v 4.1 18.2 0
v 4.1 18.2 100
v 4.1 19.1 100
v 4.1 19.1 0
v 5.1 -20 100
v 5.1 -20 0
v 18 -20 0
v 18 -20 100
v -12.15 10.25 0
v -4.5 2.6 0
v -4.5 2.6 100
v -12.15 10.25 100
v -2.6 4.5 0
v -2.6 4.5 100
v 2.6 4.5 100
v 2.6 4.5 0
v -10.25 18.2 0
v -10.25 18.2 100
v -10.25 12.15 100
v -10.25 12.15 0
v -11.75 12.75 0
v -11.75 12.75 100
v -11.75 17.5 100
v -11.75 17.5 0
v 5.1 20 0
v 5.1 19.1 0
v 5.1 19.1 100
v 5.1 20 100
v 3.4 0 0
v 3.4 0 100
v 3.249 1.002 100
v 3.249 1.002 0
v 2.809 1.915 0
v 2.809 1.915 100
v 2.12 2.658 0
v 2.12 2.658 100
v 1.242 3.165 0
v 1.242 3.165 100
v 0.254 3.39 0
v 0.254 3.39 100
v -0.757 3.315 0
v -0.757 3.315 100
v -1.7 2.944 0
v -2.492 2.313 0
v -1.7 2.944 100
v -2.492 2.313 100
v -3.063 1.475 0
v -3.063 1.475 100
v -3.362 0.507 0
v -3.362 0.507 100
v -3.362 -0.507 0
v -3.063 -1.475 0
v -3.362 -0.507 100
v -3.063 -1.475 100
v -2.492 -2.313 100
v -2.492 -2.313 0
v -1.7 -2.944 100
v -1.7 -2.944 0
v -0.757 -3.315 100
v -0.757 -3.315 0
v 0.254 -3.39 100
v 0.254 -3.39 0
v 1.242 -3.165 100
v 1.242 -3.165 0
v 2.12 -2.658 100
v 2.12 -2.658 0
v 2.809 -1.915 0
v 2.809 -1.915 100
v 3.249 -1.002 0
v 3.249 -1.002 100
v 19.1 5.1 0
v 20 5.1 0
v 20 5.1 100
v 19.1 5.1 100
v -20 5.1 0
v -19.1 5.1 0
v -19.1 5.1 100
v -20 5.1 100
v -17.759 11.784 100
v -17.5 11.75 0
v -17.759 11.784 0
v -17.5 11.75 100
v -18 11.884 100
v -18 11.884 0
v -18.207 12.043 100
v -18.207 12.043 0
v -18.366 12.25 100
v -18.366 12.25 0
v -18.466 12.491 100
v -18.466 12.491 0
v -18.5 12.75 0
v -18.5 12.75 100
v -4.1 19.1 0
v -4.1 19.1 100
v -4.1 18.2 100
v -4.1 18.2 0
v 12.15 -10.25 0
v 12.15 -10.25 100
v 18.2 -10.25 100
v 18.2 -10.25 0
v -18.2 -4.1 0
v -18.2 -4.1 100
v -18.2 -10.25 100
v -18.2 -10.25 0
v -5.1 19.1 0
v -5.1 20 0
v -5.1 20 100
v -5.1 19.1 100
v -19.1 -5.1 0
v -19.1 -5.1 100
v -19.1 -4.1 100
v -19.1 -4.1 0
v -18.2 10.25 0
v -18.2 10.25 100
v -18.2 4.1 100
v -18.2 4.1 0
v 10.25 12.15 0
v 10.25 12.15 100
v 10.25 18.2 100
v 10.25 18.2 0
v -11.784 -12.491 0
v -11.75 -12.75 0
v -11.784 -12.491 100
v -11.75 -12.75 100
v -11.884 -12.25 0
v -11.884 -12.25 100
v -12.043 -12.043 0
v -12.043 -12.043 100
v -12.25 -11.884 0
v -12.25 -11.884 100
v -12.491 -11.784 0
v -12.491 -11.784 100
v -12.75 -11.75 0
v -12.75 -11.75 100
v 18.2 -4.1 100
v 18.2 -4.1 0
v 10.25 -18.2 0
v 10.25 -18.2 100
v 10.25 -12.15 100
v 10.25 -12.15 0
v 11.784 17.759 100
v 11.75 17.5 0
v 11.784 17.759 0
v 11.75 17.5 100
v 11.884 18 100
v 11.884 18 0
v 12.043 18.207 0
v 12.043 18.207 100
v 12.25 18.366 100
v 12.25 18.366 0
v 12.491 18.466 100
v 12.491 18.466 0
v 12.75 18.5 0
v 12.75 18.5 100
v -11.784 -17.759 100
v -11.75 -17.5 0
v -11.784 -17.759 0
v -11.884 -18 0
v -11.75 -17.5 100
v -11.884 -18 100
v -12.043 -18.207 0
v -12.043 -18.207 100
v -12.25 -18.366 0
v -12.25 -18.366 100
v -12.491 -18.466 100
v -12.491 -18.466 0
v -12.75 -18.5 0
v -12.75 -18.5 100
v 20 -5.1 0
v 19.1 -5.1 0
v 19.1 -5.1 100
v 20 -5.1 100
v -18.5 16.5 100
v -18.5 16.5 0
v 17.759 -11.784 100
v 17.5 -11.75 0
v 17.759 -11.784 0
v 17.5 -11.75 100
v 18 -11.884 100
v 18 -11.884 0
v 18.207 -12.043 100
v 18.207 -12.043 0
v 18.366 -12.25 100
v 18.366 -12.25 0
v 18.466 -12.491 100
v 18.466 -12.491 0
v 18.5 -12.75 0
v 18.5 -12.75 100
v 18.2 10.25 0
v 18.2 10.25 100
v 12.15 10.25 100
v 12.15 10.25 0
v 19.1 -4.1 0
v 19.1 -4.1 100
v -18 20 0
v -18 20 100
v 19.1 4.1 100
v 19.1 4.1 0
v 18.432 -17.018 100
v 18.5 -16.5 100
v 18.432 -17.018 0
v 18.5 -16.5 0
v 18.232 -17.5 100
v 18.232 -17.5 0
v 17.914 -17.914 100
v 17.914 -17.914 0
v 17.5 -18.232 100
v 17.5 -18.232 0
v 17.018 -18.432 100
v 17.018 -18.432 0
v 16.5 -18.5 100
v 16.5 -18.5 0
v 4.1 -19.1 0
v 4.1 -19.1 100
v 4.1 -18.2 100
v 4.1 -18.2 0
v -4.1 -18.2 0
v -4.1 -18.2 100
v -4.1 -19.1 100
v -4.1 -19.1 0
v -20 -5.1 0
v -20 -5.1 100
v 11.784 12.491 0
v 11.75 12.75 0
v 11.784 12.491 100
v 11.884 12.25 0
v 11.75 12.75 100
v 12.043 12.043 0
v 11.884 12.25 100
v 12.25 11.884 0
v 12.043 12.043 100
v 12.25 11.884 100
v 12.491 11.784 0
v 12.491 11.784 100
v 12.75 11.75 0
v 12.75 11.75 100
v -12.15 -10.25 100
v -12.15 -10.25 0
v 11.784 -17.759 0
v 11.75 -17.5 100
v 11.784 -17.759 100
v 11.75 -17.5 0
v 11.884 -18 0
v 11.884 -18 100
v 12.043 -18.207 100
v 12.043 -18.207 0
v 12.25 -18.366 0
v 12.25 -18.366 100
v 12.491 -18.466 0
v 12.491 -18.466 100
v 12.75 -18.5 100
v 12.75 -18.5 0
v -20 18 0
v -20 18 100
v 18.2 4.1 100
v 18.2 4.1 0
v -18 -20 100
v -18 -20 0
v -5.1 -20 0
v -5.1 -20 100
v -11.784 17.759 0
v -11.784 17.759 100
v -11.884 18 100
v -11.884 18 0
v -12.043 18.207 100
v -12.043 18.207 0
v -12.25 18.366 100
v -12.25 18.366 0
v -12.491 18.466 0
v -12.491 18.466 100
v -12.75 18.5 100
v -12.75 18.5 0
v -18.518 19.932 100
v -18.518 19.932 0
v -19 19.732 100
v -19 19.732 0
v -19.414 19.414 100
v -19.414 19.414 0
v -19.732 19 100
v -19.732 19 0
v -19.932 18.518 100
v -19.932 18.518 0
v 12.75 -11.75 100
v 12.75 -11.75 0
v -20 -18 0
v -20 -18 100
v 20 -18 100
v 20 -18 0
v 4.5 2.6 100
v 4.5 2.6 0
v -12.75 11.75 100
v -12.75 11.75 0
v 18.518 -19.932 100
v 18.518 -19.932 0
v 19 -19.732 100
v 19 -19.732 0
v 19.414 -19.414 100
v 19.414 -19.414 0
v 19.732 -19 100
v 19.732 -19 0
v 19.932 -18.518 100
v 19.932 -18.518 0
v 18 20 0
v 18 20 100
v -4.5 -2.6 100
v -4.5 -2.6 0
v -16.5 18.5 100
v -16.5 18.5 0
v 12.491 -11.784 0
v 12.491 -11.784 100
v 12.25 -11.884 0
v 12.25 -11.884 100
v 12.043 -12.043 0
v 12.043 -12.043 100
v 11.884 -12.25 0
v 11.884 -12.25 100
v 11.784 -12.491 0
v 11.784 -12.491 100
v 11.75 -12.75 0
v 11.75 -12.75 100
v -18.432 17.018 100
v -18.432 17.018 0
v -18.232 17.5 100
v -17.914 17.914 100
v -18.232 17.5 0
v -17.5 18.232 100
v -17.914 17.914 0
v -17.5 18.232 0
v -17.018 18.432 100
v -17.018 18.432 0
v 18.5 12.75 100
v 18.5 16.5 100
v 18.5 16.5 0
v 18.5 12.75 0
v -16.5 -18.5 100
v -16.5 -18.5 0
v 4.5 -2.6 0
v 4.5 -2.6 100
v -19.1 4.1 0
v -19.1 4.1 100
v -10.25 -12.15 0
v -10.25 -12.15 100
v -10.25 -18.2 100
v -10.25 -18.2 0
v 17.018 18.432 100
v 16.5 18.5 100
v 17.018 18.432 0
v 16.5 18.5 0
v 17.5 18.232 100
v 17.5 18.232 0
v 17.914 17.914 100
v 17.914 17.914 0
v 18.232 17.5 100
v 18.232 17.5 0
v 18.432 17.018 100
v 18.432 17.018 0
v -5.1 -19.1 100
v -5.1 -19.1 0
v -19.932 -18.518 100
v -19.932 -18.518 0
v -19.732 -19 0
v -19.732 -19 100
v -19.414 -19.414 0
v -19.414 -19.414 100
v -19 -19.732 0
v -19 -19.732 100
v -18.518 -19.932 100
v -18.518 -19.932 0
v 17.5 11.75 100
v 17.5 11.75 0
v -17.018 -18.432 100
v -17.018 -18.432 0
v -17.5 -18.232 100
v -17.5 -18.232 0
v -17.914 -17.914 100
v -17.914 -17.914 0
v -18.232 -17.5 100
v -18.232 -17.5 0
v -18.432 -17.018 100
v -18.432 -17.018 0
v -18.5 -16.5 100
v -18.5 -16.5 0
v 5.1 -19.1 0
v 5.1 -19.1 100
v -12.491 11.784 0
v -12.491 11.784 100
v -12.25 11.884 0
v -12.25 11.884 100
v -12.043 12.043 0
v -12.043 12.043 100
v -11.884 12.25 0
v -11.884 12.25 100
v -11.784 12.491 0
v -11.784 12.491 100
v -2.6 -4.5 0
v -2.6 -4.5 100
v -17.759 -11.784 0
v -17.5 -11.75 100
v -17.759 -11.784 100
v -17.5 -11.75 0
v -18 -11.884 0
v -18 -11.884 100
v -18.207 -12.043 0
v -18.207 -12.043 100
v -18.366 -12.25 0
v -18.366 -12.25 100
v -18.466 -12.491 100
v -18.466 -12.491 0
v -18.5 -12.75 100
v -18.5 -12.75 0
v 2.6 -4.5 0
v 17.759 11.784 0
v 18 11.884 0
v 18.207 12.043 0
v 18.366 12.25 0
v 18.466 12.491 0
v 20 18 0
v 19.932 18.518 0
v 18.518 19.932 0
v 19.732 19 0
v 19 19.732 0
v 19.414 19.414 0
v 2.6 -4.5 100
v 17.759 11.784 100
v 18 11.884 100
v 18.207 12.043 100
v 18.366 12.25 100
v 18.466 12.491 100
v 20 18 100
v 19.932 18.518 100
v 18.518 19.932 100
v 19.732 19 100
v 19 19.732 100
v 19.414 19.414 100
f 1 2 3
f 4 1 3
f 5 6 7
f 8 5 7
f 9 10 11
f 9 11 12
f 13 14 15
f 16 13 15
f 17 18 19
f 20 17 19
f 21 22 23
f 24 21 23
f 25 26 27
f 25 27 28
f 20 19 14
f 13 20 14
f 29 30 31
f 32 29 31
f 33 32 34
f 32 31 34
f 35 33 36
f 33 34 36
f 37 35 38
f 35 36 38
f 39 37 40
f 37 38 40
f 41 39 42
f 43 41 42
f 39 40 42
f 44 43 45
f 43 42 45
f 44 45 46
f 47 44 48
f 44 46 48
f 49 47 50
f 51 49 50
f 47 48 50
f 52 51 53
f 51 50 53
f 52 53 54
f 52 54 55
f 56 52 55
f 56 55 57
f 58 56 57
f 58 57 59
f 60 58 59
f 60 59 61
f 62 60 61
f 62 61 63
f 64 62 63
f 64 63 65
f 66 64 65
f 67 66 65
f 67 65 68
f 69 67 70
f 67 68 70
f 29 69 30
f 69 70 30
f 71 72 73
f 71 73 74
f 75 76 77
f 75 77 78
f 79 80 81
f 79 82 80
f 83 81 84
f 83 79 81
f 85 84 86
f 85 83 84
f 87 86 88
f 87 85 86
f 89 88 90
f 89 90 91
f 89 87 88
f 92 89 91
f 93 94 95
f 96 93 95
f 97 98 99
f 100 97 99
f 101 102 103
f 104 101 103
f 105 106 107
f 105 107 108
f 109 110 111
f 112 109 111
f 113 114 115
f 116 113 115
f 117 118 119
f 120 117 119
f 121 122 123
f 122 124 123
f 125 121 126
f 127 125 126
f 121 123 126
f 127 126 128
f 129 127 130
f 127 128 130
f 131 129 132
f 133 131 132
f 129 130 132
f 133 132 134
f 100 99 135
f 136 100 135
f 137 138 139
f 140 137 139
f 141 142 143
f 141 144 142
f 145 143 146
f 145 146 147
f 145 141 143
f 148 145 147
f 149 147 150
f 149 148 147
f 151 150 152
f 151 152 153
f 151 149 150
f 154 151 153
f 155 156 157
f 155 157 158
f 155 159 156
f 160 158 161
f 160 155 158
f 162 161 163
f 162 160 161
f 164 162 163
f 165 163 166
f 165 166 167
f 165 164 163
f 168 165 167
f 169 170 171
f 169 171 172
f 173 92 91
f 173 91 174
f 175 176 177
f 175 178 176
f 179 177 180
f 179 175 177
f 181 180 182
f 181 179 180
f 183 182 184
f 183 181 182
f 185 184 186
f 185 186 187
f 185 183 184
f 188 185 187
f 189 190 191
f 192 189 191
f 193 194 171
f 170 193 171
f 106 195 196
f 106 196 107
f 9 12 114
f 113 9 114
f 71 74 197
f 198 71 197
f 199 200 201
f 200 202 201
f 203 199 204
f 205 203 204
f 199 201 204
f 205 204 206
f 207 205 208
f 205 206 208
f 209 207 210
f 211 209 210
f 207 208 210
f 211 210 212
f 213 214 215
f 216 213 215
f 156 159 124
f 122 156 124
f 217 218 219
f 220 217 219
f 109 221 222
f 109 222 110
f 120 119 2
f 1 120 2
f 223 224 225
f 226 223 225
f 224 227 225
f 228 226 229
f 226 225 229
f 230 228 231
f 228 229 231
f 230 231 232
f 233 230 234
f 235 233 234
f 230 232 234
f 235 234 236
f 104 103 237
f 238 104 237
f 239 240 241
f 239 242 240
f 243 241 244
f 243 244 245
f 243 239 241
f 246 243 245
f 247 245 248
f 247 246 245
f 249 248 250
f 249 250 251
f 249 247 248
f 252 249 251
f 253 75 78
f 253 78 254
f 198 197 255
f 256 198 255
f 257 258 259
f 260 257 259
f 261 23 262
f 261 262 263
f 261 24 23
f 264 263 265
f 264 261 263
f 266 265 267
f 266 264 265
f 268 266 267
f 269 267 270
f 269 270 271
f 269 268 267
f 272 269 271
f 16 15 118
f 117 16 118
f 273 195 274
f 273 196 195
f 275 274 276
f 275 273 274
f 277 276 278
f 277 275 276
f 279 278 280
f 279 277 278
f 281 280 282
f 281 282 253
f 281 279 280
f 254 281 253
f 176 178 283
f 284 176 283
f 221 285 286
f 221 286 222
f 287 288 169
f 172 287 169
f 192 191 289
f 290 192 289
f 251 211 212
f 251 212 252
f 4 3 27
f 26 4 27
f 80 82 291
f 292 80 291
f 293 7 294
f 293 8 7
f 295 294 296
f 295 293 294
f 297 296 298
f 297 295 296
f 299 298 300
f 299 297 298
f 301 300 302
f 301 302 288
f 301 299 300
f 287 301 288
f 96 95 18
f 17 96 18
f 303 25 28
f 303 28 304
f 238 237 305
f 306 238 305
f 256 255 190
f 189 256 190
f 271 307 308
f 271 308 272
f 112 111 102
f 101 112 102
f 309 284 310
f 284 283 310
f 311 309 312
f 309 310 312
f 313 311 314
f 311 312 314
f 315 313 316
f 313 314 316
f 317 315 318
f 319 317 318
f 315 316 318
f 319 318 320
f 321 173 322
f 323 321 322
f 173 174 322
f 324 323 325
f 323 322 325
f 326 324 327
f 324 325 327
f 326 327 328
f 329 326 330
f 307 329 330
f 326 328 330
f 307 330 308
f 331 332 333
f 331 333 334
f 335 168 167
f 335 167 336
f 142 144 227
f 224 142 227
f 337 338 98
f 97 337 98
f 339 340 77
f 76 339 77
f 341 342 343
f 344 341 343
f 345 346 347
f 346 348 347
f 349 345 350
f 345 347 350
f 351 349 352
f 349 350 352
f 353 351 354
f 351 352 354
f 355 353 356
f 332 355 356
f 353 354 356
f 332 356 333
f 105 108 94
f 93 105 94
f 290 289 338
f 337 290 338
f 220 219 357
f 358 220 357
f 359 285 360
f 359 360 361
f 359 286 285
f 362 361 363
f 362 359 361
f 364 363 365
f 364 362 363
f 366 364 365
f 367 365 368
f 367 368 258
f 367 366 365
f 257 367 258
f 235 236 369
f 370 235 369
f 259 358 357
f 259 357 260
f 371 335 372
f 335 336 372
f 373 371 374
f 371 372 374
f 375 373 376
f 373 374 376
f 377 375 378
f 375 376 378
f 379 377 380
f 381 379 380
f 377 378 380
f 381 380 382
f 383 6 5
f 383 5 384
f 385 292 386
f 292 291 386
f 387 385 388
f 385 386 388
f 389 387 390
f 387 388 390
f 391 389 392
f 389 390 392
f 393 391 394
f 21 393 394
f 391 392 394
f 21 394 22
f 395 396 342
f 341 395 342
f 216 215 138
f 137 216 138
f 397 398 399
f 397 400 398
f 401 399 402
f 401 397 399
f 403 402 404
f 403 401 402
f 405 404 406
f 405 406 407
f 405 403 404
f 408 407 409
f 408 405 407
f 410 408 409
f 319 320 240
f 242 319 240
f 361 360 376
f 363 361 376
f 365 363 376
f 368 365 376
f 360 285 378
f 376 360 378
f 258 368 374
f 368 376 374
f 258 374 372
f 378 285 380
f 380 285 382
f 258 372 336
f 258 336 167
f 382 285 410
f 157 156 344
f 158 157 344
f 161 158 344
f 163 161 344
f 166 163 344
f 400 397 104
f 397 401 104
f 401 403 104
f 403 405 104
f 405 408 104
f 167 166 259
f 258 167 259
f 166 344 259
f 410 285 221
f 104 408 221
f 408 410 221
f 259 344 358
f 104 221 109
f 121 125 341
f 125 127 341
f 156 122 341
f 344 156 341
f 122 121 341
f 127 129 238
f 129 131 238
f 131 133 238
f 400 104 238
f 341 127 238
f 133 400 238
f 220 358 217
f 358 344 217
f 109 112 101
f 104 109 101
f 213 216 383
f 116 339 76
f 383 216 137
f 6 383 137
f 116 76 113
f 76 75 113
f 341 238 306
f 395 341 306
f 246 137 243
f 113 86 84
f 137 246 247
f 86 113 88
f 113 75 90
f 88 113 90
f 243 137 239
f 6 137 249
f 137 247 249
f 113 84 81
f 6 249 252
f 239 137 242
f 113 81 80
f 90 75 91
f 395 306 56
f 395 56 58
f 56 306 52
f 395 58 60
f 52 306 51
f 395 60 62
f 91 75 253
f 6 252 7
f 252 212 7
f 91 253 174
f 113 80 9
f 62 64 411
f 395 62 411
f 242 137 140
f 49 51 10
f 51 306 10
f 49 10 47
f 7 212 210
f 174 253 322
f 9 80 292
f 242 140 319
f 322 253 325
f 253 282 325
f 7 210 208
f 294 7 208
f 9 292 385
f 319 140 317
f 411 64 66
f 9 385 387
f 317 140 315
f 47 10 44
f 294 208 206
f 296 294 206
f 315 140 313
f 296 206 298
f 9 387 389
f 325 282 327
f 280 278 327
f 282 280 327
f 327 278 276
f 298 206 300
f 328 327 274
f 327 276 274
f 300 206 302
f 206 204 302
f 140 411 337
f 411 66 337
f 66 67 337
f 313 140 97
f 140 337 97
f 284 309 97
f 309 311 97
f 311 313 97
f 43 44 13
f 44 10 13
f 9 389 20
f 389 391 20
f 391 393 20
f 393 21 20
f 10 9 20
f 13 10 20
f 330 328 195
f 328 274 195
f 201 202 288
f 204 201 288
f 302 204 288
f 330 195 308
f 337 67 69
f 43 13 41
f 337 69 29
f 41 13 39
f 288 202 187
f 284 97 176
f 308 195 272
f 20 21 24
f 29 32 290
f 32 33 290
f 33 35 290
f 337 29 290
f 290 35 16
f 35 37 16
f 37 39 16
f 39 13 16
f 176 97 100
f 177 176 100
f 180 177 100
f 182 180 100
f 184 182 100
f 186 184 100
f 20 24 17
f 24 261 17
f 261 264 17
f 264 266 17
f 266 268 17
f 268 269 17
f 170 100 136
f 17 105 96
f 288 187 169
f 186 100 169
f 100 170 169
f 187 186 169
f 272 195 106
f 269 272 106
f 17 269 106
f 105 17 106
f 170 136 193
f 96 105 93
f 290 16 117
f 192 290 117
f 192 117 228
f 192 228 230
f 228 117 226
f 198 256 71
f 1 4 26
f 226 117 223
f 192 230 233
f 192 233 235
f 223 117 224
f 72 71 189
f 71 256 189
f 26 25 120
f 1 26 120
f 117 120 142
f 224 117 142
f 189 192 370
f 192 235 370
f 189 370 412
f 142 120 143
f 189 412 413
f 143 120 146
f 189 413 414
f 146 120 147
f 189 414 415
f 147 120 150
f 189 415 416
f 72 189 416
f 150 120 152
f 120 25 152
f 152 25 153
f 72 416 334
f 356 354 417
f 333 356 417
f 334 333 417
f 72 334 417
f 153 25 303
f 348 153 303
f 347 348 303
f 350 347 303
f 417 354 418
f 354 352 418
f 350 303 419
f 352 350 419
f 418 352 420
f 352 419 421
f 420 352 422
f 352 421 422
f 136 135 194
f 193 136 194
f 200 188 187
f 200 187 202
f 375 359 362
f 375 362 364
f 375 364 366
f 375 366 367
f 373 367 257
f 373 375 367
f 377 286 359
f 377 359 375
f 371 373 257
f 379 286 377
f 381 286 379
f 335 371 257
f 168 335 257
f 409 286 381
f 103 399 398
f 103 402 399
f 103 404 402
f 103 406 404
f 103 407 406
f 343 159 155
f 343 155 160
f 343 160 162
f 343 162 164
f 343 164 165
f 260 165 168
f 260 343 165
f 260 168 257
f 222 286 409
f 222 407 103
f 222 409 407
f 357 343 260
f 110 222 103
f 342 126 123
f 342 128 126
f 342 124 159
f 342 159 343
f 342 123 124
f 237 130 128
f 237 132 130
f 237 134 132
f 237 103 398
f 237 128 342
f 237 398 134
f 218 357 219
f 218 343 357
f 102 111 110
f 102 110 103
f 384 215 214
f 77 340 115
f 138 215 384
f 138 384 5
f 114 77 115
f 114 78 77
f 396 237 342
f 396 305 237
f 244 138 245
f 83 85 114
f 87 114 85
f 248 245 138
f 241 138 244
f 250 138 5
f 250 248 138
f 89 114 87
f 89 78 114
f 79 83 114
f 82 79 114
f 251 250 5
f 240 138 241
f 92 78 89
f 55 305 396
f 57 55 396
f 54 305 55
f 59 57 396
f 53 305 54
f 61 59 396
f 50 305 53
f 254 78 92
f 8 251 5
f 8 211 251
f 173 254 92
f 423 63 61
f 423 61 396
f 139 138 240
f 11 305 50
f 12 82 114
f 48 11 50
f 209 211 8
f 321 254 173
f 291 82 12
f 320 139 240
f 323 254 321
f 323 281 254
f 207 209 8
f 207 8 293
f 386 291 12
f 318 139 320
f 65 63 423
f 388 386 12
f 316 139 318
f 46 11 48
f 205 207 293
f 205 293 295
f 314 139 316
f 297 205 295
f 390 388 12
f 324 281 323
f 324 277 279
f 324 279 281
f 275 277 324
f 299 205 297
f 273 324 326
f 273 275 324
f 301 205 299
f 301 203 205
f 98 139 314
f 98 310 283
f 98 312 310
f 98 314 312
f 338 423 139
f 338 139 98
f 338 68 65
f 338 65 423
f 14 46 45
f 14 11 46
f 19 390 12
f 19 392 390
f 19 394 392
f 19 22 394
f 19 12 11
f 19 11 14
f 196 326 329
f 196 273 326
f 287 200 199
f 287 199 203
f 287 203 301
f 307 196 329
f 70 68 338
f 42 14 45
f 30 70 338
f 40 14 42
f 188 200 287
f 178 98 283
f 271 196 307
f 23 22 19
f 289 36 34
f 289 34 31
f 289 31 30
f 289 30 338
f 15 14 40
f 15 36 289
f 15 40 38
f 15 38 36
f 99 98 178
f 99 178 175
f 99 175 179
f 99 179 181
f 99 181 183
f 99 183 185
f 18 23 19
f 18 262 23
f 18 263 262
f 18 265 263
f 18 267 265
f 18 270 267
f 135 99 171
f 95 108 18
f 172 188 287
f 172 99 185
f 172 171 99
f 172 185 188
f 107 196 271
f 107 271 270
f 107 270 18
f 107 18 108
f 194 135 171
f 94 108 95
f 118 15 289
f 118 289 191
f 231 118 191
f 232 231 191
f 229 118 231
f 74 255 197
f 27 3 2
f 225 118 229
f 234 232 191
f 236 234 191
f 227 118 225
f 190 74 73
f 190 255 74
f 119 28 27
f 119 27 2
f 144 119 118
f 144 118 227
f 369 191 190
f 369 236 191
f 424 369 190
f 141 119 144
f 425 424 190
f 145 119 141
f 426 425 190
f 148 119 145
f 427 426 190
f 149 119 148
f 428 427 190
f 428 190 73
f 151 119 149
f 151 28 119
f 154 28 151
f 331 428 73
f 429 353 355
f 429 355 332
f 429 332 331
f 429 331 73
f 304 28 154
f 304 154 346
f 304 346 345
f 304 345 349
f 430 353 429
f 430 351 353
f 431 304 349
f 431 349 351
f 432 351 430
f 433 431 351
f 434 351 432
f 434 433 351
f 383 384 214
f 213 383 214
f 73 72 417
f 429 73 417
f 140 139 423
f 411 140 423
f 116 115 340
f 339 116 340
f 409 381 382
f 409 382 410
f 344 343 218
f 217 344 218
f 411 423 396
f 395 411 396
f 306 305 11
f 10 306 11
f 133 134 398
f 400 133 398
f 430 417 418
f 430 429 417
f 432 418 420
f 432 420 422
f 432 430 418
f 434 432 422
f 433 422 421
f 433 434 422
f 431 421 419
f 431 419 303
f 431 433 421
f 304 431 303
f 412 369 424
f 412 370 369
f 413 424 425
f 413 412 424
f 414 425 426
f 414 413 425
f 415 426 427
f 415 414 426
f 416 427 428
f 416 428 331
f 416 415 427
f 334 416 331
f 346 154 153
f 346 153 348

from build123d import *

# Parameters (mm, degrees)
SKETCH_1_W                       = 40
SKETCH_1_H                       = 40
EXTRUDE_1_DEPTH                  = 100
SKETCH_2_R                       = 3.4
CUT_EXTRUDE_1_DEPTH              = 104.923048454
PATTERN_CIRCULAR_1_COUNT         = 4
FILLET_1_R                       = 2
SKETCH_4_W                       = 6.75
SKETCH_4_H                       = 6.75
CUT_EXTRUDE_2_DEPTH              = 104.923048454
FILLET_2_R                       = 1
FILLET_4_R                       = 2
PATTERN_CIRCULAR_2_COUNT         = 4
FILLET_2_OF_PATTERN_CIRCULAR_2_R = 1
FILLET_4_OF_PATTERN_CIRCULAR_2_R = 2


with BuildPart() as part:
    # 草图1 → 凸台-拉伸1 (new body)
    with BuildSketch(Plane.XY):
        Rectangle(SKETCH_1_W, SKETCH_1_H)
    extrude(amount=EXTRUDE_1_DEPTH)

    # 草图2 → 切除-拉伸1 (cut, through all)
    with BuildSketch(Plane.XY.offset(100)):
        Polygon((-20, -5.1), (-19.1, -5.1), (-19.1, -4.1), (-18.2, -4.1), (-18.2, -10.25), (-12.15, -10.25), (-4.5, -2.6), (-4.5, 2.6), (-12.15, 10.25), (-18.2, 10.25), (-18.2, 4.1), (-19.1, 4.1), (-19.1, 5.1), (-20, 5.1), align=None)
        Circle(SKETCH_2_R)
    cut_extrude_1 = extrude(amount=-CUT_EXTRUDE_1_DEPTH, mode=Mode.SUBTRACT)

    # 阵列(圆周)1: 切除-拉伸1 ×4 about axis
    pattern_circular_1_axis = Axis((0, 0, 0), (0, 0, 1))
    for i in range(1, PATTERN_CIRCULAR_1_COUNT):
        add(cut_extrude_1.rotate(pattern_circular_1_axis, i * 360 / PATTERN_CIRCULAR_1_COUNT), mode=Mode.SUBTRACT)

    # 圆角1
    fillet_1_edges = [part.edges().sort_by_distance(p)[0] for p in [
        (-20, -20, 50),
        (20, -20, 50),
        (20, 20, 50),
        (-20, 20, 50),
    ]]
    fillet(fillet_1_edges, radius=FILLET_1_R)

    # 草图4 → 切除-拉伸2 (cut, symmetric)
    with BuildSketch(Plane.XY.offset(100)):
        with Locations((-15.125, 15.125)):
            Rectangle(SKETCH_4_W, SKETCH_4_H)
    cut_extrude_2 = extrude(amount=CUT_EXTRUDE_2_DEPTH, both=True, mode=Mode.SUBTRACT)

    # 圆角2
    fillet_2_edges = [part.edges().sort_by_distance(p)[0] for p in [
        (-11.75, 18.5, 50),
        (-11.75, 11.75, 50),
        (-18.5, 11.75, 50),
    ]]
    fillet(fillet_2_edges, radius=FILLET_2_R)

    # 圆角4
    fillet_4_edges = [part.edges().sort_by_distance(p)[0] for p in [
        (-18.5, 18.5, 50),
    ]]
    fillet(fillet_4_edges, radius=FILLET_4_R)

    # 阵列(圆周)2: 切除-拉伸2 ×4 about axis
    pattern_circular_2_axis = Axis((0, 0, 0), (0, 0, 1))
    for i in range(1, PATTERN_CIRCULAR_2_COUNT):
        add(cut_extrude_2.rotate(pattern_circular_2_axis, i * 360 / PATTERN_CIRCULAR_2_COUNT), mode=Mode.SUBTRACT)

    # 圆角2 of 阵列(圆周)2
    fillet_2_of_pattern_circular_2_edges = [part.edges().sort_by_distance(p)[0] for p in [
        (-18.5, -11.75, 50),
        (-11.75, -11.75, 50),
        (-11.75, -18.5, 50),
        (11.75, -18.5, 50),
        (11.75, -11.75, 50),
        (18.5, -11.75, 50),
        (18.5, 11.75, 50),
        (11.75, 11.75, 50),
        (11.75, 18.5, 50),
    ]]
    fillet(fillet_2_of_pattern_circular_2_edges, radius=FILLET_2_OF_PATTERN_CIRCULAR_2_R)

    # 圆角4 of 阵列(圆周)2
    fillet_4_of_pattern_circular_2_edges = [part.edges().sort_by_distance(p)[0] for p in [
        (-18.5, -18.5, 50),
        (18.5, -18.5, 50),
        (18.5, 18.5, 50),
    ]]
    fillet(fillet_4_of_pattern_circular_2_edges, radius=FILLET_4_OF_PATTERN_CIRCULAR_2_R)


solid = part.part
